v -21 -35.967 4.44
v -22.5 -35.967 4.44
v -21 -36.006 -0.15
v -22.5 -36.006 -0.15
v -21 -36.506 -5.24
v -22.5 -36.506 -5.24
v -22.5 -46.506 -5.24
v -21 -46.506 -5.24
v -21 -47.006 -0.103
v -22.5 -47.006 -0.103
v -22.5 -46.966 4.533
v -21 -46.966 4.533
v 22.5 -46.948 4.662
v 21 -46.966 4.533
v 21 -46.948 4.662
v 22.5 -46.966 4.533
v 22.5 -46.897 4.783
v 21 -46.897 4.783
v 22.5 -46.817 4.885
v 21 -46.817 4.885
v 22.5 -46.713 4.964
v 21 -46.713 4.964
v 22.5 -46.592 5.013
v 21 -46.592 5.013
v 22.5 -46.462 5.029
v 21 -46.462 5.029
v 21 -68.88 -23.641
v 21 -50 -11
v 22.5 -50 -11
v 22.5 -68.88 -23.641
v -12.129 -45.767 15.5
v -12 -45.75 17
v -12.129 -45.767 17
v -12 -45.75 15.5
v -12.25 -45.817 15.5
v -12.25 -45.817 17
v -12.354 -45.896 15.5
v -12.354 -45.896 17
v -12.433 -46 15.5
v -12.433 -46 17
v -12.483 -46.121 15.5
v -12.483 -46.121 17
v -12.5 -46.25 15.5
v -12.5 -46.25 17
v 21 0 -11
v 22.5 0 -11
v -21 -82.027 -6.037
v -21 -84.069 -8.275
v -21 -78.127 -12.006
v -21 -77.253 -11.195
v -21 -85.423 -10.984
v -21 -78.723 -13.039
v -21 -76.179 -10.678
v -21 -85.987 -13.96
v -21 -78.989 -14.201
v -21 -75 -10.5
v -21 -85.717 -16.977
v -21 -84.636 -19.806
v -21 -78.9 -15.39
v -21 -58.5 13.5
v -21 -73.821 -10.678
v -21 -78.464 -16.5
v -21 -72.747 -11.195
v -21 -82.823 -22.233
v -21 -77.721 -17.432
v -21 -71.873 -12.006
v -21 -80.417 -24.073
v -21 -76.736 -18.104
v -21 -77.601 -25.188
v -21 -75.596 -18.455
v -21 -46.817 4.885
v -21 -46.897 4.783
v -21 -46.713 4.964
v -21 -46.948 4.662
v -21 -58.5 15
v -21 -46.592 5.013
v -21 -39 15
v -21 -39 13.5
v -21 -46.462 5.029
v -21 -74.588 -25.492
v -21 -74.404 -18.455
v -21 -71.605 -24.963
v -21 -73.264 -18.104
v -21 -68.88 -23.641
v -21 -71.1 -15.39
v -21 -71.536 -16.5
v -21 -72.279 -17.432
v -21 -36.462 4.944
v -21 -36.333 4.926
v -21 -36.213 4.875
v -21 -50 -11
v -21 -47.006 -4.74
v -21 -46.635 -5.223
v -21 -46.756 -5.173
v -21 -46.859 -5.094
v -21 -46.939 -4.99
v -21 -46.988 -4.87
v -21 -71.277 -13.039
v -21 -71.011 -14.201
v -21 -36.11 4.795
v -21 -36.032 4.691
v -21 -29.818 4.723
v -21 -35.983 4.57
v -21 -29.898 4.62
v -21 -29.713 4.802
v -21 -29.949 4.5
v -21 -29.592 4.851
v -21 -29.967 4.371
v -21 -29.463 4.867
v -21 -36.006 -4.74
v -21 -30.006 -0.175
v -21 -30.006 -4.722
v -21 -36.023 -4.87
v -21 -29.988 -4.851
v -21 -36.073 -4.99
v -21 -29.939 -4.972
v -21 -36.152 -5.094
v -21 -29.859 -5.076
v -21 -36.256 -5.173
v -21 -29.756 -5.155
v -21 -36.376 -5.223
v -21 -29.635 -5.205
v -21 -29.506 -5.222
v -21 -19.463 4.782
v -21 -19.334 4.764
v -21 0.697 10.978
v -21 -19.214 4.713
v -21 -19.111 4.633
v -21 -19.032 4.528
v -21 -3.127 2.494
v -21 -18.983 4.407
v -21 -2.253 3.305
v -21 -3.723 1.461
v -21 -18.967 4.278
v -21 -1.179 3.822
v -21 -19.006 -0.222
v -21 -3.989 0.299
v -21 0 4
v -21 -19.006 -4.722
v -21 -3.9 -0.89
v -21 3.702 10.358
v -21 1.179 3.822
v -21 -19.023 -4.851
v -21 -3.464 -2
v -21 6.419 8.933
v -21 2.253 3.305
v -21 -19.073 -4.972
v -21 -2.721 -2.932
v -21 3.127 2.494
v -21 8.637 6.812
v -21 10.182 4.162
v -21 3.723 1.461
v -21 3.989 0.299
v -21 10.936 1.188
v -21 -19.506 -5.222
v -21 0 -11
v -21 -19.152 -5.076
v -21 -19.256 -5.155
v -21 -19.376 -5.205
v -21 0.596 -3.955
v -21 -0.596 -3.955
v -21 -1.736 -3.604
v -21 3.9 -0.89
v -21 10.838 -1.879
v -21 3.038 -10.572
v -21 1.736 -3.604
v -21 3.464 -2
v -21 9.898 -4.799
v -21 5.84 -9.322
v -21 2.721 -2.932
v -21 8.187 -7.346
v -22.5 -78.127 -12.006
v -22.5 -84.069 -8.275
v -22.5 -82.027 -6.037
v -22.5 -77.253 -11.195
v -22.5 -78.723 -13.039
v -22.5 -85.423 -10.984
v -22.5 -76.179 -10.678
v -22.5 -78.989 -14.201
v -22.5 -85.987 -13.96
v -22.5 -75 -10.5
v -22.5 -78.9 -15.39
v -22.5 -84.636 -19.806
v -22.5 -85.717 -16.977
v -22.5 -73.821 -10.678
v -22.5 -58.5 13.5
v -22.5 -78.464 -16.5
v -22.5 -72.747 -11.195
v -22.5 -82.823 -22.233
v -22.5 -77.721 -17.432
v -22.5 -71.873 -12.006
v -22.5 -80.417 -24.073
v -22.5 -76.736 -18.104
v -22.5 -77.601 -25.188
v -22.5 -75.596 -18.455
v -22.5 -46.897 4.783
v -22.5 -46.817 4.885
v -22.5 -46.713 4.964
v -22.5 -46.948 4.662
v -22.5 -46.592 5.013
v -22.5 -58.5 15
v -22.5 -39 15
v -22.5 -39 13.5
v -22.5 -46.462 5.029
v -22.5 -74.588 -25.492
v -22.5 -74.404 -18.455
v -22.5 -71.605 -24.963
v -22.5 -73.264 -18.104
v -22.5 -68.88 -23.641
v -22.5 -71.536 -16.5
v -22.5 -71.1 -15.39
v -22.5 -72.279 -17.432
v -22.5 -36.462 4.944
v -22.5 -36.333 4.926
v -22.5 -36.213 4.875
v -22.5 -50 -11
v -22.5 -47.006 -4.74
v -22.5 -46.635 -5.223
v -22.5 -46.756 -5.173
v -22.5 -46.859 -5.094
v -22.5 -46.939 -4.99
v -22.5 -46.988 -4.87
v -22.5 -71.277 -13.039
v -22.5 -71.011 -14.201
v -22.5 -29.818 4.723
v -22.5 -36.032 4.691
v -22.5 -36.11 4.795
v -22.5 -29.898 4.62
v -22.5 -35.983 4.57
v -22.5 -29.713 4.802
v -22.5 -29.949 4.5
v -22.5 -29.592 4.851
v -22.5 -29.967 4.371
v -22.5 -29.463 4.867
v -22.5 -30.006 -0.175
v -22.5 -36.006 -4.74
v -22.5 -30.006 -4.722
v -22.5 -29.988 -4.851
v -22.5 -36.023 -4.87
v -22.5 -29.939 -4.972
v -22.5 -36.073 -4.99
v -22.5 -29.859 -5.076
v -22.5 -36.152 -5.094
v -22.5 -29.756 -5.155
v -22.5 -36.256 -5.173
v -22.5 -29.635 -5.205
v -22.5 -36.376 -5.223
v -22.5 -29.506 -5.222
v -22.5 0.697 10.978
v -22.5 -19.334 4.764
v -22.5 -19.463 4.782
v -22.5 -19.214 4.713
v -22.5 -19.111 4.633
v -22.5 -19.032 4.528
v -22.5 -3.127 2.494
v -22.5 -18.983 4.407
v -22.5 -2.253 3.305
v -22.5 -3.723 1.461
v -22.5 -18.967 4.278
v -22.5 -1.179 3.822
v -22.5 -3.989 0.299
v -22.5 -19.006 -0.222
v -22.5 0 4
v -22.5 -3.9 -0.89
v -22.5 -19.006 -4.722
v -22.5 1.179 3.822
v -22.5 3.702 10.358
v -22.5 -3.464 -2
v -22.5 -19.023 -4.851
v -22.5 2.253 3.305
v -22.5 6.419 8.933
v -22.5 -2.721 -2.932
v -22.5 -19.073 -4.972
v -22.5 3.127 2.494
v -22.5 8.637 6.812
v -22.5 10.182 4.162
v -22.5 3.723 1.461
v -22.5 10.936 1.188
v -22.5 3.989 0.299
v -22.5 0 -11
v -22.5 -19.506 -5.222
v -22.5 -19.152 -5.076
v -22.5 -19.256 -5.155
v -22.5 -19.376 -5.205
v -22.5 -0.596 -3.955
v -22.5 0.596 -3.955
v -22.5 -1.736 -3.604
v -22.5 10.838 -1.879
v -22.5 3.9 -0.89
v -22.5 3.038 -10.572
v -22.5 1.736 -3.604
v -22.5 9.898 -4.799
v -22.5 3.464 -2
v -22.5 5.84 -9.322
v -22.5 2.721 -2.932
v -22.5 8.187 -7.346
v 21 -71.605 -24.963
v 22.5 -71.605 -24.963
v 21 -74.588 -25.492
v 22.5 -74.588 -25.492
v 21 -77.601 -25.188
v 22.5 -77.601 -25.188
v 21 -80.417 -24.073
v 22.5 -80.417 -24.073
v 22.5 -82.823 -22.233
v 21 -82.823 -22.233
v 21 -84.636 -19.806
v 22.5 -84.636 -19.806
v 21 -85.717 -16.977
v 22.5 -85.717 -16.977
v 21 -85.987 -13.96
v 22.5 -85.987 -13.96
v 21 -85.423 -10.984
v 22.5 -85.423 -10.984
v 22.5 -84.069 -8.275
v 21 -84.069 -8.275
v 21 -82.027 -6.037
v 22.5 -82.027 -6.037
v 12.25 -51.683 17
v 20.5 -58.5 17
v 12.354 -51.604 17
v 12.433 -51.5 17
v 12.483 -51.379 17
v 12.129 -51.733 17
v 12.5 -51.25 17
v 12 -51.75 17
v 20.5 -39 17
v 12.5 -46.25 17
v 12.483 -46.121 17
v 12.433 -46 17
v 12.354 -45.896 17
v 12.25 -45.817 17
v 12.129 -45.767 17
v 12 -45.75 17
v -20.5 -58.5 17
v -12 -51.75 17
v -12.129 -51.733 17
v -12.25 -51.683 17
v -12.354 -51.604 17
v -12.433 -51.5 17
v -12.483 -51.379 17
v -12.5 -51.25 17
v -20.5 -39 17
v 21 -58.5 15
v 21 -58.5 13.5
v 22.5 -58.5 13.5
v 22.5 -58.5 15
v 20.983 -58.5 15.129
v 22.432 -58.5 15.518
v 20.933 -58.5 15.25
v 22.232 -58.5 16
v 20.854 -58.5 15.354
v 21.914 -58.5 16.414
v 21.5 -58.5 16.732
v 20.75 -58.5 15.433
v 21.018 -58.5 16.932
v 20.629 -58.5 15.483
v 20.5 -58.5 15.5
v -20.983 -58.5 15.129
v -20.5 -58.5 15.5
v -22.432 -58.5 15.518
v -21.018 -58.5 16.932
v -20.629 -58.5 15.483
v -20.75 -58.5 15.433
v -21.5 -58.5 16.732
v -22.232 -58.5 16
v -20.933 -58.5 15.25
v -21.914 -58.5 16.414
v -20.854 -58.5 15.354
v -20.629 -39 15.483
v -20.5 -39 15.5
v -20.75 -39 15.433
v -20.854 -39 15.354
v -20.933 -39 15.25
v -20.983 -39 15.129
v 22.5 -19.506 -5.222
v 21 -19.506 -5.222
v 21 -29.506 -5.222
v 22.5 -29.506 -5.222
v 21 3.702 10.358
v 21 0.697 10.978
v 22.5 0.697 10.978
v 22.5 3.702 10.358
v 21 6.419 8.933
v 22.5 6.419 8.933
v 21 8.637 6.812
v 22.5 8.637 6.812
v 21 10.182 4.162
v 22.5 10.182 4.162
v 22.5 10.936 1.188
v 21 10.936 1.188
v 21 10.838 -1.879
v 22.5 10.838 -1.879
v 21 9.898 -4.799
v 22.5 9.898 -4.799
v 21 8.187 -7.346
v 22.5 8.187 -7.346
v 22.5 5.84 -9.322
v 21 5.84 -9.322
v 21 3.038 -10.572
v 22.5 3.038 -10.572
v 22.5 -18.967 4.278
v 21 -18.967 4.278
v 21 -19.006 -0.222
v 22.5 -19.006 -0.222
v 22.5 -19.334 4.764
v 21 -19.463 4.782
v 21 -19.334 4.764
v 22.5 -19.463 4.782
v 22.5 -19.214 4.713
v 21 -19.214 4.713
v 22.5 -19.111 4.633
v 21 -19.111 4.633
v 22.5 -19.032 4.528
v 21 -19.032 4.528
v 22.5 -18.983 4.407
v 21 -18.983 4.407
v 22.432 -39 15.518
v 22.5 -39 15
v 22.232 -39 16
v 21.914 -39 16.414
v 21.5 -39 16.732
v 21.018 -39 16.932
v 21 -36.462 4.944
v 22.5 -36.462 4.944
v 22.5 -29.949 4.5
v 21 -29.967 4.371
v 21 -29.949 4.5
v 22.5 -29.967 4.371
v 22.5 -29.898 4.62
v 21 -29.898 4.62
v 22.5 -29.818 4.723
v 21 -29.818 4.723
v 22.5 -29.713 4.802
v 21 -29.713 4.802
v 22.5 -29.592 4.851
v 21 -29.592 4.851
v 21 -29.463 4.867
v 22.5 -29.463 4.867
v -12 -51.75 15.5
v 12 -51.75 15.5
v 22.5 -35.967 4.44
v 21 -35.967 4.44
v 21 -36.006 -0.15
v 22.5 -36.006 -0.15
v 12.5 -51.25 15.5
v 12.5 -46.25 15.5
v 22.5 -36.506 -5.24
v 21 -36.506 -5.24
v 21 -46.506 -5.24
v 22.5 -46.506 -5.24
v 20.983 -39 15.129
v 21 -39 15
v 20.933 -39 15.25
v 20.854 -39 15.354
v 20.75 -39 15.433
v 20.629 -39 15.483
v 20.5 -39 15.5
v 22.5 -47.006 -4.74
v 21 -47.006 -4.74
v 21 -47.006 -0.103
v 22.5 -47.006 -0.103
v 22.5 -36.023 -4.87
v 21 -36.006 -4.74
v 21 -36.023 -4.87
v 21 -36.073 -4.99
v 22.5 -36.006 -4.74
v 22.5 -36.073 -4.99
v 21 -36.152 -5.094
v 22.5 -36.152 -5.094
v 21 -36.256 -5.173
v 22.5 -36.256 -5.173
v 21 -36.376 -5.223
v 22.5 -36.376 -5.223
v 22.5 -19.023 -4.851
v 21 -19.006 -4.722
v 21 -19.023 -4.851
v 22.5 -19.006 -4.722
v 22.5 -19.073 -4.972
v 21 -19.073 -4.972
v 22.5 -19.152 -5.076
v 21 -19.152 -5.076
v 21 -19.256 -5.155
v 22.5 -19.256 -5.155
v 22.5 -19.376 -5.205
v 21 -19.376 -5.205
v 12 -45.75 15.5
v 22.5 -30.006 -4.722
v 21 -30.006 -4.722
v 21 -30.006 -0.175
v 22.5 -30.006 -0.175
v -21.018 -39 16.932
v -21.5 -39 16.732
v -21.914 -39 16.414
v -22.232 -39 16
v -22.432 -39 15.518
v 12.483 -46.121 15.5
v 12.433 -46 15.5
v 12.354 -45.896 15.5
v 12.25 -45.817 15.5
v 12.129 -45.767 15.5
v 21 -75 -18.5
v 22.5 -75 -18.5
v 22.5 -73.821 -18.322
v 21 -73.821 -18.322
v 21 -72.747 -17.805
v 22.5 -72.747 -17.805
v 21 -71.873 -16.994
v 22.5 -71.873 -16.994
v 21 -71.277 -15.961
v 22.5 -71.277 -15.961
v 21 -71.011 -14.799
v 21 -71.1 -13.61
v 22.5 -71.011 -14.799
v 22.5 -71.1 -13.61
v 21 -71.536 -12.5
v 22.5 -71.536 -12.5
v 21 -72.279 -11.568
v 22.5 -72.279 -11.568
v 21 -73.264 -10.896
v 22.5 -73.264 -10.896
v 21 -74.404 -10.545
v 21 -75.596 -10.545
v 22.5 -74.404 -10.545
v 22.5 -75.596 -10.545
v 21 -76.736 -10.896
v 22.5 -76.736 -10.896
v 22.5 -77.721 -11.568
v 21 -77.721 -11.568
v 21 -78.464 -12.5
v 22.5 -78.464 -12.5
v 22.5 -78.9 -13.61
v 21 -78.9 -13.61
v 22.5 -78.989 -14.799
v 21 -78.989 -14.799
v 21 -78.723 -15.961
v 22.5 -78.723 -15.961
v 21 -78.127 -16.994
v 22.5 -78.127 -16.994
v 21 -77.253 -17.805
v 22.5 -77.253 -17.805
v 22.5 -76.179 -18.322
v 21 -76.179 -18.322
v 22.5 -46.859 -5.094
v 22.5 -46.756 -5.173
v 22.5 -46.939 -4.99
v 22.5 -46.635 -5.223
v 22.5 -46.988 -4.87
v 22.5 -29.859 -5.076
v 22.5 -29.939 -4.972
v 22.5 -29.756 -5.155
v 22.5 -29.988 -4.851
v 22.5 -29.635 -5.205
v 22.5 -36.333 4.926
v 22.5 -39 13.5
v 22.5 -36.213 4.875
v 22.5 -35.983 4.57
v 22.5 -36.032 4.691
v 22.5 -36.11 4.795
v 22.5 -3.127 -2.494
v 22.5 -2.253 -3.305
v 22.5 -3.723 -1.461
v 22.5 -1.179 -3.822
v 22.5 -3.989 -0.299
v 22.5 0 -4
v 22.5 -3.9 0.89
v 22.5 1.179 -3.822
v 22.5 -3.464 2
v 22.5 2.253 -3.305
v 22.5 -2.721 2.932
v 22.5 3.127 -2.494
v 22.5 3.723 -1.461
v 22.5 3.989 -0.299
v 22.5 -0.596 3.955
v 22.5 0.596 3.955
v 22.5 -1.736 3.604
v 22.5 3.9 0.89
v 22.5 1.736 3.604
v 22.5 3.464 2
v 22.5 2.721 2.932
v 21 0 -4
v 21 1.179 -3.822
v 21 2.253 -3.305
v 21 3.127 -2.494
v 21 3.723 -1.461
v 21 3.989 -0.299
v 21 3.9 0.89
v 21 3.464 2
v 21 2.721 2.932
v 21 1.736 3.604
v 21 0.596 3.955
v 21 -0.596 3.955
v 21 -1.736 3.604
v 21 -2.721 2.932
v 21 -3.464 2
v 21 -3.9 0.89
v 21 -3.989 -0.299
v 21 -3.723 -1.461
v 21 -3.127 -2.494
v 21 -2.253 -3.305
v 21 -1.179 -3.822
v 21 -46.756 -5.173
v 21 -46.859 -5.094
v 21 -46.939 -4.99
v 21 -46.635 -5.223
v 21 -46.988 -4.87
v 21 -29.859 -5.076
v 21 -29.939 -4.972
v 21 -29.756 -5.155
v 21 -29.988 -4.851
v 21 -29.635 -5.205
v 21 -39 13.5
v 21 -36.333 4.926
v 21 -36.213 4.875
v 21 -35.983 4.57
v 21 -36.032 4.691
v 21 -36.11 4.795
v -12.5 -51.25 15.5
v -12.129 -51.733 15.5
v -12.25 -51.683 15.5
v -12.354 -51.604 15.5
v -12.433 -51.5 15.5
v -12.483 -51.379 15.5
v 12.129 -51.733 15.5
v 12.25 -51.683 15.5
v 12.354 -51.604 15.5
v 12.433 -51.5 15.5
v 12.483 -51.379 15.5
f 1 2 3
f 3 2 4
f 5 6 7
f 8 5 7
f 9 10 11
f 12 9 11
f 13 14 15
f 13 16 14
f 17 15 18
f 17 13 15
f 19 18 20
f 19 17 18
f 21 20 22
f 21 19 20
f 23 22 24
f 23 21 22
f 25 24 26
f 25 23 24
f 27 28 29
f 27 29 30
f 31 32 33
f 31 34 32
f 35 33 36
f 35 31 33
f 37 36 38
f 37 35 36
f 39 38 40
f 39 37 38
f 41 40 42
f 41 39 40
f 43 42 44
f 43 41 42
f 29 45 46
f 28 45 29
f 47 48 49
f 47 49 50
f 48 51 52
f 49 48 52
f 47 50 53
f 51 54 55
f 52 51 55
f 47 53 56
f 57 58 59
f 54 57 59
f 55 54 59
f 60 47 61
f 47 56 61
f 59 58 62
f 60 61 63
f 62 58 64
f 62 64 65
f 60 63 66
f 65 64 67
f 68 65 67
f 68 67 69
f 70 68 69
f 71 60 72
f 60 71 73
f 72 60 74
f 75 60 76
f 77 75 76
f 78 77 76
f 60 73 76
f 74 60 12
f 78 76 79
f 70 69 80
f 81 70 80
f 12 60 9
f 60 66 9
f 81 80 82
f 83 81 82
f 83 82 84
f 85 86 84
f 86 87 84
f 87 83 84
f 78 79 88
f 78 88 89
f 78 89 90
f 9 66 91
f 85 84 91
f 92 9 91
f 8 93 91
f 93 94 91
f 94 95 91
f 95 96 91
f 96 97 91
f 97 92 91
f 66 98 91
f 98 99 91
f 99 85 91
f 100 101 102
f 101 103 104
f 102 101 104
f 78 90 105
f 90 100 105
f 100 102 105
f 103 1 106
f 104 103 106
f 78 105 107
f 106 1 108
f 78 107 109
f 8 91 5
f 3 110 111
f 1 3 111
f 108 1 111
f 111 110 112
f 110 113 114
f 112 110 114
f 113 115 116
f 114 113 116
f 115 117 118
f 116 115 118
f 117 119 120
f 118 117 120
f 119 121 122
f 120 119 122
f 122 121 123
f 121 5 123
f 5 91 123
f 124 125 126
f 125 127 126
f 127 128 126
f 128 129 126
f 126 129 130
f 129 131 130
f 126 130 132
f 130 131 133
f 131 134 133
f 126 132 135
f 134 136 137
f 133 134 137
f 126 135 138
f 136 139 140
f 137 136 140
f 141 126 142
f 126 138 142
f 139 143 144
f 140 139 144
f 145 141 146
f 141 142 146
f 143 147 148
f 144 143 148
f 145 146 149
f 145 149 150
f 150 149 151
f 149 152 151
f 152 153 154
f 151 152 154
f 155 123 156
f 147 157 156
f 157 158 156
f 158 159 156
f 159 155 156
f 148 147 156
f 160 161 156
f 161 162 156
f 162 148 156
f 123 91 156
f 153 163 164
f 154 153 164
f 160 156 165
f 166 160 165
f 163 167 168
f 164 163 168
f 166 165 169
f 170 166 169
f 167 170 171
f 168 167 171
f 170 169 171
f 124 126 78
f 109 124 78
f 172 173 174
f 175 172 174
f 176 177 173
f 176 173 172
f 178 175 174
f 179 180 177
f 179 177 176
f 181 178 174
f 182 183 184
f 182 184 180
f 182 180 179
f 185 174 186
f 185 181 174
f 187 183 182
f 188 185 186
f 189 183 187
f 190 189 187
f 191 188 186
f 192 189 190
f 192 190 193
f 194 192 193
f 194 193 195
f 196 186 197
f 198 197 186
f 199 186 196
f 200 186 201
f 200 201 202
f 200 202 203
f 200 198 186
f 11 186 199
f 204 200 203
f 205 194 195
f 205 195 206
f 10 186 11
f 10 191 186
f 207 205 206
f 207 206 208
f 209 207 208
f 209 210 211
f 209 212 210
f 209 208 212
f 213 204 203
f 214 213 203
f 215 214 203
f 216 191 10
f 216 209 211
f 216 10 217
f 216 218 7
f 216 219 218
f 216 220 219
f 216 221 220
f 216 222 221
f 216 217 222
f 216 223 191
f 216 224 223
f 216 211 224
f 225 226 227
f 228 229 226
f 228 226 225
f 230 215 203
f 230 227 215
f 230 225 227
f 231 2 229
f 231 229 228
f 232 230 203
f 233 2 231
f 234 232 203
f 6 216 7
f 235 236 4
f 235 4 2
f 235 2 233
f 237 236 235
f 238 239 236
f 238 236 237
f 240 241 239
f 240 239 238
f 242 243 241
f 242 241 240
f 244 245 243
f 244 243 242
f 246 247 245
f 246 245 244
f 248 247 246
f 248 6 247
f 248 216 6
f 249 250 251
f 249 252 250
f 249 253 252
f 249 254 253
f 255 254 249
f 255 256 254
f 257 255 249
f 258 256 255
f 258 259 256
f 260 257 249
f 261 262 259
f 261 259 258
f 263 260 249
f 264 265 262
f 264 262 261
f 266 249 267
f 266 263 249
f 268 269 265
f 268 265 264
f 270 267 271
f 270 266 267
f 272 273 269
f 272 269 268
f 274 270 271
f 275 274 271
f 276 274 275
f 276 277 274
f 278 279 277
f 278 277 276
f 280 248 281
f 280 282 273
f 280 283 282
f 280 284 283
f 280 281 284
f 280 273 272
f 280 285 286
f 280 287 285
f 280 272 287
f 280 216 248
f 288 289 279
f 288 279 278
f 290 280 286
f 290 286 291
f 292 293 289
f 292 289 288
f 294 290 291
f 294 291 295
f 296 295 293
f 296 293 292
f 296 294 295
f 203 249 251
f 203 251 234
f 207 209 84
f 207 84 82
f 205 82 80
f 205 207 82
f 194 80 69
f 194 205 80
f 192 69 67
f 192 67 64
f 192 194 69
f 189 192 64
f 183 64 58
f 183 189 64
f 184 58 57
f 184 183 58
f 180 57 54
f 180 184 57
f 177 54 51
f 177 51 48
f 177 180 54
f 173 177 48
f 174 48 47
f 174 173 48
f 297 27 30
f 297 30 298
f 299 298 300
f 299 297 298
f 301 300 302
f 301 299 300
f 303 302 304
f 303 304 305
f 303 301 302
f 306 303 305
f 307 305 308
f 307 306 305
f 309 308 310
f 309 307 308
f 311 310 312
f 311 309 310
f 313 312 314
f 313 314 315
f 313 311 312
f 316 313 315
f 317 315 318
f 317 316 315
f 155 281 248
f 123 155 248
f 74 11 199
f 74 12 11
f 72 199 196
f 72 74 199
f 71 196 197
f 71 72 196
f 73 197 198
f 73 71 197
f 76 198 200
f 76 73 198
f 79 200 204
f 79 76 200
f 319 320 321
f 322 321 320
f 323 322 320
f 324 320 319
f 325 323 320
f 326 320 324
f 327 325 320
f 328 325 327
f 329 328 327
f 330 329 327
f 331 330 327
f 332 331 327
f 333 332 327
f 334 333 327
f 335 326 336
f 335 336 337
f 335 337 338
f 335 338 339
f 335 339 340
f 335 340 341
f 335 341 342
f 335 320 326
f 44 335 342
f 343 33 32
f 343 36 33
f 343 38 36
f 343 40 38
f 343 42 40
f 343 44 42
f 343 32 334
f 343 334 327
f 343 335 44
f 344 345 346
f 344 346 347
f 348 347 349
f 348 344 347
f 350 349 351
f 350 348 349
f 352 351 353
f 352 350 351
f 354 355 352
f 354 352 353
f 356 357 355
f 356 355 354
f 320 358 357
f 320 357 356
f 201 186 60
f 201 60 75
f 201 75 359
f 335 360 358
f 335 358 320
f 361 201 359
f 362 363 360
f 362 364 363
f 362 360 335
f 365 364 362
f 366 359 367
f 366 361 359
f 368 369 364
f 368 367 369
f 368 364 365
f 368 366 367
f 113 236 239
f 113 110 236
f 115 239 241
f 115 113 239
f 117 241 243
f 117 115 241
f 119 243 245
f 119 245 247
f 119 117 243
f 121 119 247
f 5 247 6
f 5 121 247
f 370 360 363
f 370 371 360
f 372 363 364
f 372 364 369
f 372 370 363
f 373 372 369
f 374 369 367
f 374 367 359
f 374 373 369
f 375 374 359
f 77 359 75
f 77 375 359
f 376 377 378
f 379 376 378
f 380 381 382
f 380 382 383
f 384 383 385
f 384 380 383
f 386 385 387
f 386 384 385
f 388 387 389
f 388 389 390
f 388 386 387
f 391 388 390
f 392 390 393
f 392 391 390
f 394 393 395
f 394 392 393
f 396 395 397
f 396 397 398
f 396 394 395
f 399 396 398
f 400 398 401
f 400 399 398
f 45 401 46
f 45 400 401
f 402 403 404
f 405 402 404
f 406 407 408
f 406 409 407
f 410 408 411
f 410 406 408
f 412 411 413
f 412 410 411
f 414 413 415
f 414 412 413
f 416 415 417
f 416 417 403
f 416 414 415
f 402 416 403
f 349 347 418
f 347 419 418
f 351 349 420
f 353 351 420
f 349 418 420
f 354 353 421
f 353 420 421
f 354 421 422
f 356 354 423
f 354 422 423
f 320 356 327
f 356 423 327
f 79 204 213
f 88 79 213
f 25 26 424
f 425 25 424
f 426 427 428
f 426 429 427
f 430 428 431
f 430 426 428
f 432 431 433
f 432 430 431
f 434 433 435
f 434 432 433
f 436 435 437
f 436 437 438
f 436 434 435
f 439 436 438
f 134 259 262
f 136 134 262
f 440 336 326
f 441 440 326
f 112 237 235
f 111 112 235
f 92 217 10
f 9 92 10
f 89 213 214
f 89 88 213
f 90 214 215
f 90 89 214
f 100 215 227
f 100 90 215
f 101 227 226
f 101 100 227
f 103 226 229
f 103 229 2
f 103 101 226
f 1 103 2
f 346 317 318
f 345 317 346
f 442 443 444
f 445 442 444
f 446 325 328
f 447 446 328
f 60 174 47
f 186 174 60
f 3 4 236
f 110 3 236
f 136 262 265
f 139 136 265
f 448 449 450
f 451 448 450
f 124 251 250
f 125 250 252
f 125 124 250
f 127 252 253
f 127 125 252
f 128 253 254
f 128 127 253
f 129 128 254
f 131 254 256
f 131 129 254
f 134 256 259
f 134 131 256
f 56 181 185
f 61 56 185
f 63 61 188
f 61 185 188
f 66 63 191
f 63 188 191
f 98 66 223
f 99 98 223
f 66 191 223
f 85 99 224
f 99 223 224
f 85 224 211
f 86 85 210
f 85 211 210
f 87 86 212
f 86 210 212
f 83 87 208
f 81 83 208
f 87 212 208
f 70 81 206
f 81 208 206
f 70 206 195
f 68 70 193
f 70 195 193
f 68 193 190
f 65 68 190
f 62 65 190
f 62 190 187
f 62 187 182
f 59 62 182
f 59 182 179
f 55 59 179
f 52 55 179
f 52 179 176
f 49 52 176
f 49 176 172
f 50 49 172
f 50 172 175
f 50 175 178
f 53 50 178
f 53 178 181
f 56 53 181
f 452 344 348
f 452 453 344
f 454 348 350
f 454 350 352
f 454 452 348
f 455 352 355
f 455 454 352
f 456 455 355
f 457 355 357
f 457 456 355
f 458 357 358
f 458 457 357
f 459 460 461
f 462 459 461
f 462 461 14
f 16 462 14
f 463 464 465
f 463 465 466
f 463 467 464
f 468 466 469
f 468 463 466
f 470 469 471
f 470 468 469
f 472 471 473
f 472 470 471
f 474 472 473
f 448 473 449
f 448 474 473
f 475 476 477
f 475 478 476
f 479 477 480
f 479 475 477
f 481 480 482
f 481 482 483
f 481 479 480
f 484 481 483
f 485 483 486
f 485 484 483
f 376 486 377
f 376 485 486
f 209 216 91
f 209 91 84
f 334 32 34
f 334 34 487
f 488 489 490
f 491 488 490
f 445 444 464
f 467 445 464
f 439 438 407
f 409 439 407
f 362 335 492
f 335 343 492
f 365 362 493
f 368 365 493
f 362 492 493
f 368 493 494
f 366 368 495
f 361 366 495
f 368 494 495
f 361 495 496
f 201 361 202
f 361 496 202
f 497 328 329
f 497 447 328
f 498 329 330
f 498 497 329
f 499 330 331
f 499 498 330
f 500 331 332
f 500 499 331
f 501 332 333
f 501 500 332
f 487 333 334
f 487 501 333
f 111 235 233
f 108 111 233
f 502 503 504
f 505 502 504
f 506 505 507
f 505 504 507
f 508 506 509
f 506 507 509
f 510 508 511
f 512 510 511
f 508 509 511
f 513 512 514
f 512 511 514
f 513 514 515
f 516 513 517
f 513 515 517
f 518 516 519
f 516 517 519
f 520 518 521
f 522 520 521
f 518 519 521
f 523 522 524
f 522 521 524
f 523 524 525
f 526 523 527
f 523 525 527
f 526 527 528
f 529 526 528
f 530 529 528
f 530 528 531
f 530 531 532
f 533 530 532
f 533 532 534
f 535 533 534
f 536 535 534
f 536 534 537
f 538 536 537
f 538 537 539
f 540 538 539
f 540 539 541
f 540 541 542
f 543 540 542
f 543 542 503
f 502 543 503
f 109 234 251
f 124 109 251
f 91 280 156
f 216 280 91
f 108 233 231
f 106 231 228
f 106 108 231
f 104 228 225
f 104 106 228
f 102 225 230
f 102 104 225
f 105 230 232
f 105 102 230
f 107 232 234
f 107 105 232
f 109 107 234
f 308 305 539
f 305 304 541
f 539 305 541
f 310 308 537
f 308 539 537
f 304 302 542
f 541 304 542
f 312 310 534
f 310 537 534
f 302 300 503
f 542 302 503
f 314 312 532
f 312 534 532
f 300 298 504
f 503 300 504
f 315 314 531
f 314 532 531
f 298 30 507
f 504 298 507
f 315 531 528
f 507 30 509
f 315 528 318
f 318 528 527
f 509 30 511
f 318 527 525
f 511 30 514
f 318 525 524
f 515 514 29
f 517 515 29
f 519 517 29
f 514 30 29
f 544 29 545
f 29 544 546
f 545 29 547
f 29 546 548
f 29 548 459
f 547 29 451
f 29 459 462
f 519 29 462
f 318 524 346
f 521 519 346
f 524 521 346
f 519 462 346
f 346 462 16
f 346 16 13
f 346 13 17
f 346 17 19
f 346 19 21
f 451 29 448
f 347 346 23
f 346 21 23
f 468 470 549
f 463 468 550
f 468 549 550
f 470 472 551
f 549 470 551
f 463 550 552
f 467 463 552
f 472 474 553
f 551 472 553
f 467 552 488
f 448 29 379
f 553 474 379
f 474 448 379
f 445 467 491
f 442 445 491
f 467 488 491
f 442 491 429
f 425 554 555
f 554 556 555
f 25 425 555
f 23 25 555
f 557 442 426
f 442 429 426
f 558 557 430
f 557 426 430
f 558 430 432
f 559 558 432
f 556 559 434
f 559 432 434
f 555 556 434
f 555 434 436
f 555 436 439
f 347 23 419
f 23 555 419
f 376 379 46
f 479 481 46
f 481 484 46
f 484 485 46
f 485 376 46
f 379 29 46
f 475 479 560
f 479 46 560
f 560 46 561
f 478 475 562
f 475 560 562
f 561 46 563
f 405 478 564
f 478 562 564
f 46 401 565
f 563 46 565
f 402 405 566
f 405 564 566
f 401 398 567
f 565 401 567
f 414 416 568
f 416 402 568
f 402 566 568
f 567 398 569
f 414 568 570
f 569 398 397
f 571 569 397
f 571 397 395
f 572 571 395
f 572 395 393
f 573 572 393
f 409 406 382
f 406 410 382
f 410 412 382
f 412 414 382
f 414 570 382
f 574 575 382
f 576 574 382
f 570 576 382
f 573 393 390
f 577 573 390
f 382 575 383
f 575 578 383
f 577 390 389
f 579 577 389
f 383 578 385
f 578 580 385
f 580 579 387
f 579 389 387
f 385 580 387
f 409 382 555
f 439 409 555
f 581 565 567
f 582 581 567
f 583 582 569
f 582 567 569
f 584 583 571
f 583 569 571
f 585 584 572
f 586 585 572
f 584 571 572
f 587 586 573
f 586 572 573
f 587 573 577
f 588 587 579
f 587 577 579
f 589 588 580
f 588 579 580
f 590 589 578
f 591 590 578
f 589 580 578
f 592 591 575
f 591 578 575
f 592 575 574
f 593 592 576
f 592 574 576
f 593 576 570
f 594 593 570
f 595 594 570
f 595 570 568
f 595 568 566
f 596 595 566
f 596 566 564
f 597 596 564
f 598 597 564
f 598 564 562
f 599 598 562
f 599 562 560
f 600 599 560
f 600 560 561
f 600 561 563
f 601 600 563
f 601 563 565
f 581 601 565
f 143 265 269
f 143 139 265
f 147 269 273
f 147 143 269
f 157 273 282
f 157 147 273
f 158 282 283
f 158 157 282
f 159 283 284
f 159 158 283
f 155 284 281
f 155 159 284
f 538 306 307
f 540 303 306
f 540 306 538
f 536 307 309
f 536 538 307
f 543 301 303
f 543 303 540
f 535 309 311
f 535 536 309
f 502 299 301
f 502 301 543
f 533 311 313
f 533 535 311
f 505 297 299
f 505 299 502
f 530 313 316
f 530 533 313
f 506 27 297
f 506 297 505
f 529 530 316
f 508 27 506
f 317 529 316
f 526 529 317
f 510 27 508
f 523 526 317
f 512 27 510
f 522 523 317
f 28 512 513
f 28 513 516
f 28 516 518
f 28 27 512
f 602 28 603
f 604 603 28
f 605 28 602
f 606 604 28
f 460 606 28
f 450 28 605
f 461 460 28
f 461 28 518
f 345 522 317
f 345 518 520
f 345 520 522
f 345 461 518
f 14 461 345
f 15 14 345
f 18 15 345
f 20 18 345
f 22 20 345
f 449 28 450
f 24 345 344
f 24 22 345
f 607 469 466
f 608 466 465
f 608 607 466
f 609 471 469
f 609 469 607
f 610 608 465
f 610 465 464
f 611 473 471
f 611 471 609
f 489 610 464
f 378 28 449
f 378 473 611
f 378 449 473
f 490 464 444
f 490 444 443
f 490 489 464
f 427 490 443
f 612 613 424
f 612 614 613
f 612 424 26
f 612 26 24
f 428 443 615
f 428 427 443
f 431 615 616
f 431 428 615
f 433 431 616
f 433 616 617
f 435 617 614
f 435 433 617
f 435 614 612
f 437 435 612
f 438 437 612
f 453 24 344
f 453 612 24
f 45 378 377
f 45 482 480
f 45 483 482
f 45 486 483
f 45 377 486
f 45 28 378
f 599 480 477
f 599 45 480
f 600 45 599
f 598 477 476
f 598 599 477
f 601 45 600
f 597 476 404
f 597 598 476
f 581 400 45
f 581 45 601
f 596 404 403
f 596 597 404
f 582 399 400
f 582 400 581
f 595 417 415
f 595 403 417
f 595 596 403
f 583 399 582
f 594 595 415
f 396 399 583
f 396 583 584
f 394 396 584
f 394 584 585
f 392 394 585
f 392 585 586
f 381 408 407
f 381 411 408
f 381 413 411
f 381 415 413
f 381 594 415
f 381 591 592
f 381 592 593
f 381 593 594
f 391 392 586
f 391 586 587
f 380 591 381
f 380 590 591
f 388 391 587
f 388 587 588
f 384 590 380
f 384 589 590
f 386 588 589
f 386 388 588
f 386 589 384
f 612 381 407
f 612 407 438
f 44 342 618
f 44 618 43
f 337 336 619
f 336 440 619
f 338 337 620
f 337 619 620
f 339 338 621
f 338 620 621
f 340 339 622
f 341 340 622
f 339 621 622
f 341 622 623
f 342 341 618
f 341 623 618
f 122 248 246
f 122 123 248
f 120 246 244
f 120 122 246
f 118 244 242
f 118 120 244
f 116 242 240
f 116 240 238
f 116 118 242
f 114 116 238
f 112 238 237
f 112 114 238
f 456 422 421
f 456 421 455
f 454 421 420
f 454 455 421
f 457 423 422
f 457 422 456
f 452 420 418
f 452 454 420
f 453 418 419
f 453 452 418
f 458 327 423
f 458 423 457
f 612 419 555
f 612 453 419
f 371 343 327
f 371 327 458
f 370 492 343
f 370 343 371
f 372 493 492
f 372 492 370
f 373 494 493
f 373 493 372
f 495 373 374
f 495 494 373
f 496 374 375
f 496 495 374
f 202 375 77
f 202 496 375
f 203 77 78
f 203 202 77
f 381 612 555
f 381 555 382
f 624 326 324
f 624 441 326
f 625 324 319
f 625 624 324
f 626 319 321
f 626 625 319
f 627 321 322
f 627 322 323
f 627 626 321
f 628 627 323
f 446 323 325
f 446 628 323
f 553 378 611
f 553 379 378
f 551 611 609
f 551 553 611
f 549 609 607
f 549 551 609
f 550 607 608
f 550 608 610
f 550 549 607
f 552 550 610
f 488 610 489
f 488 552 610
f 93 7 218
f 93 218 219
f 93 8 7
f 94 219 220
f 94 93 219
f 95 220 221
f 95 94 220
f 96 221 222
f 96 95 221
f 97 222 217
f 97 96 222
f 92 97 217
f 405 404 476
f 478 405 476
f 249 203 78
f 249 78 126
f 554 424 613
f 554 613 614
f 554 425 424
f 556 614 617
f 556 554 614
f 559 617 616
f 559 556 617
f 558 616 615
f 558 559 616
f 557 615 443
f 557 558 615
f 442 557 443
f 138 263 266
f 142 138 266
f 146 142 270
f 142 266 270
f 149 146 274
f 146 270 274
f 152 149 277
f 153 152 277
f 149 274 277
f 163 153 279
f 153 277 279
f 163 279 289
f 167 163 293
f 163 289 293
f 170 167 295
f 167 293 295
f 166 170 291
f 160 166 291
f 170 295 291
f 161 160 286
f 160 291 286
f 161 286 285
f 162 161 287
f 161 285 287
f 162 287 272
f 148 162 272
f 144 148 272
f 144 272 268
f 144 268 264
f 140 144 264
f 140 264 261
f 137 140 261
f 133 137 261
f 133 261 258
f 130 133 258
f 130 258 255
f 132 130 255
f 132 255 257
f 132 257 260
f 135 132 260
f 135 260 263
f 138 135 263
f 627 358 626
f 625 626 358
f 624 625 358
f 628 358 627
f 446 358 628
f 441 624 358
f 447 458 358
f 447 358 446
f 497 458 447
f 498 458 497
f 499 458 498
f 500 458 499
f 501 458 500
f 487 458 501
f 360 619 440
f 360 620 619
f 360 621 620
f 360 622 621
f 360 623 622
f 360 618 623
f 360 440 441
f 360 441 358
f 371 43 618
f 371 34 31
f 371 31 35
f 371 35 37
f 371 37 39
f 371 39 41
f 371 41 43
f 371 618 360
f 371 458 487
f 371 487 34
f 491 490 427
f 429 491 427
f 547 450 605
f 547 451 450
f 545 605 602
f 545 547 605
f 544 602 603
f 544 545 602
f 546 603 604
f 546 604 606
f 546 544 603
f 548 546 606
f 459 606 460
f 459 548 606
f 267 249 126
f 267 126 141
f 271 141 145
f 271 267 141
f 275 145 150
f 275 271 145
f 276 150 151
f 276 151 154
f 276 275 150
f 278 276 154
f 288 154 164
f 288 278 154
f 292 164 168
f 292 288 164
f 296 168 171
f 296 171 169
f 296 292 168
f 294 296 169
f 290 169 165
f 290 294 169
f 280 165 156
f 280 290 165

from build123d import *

# Parameters (mm, degrees)
BOSS_EXTRUDE1_DEPTH          = 1.5
SKETCH2_W                    = 43.5
SKETCH2_H                    = 19.5
BOSS_EXTRUDE2_DEPTH          = 3.5
SKETCH3_W                    = 42
SKETCH3_H                    = 19.5
CUT_EXTRUDE1_DEPTH           = 2
BOSS_EXTRUDE3_DEPTH          = 1.5
F_8_0_8_DIAMETER_HOLE1_D     = 8
F_8_0_8_DIAMETER_HOLE1_DEPTH = 1.5
F_8_0_8_DIAMETER_HOLE2_D     = 8
F_8_0_8_DIAMETER_HOLE2_DEPTH = 1.5
FILLET1_R                    = 0.5
FILLET2_R                    = 2
SKETCH9_W                    = 25
SKETCH9_H                    = 6
CUT_EXTRUDE2_DEPTH           = 1.5
FILLET3_R                    = 0.5
CUT_EXTRUDE3_DEPTH           = 45
FILLET4_R                    = 0.5


with BuildPart() as part:
    # Sketch1 → Boss-Extrude1 (new body)
    with BuildSketch(Plane(origin=(-22.5, 0, 0), x_dir=(0, -1, 0), z_dir=(-1, 0, 0))):
        with BuildLine():
            Line((82.02741971, -6.037413385), (58.5, 13.5))
            Line((58.5, 13.5), (39, 13.5))
            Line((39, 13.5), (-0.697466415, 10.97786594))
            ThreePointArc((-0.697466415, 10.97786594), (-10.994465093, -0.348908769), (0, -11))
            Line((0, -11), (50, -11))
            Line((50, -11), (68.880323706, -23.640544954))
            ThreePointArc((68.880323706, -23.640544954), (83.813260452, -21.082282295), (82.02741971, -6.037413385))
        make_face()
    extrude(amount=-BOSS_EXTRUDE1_DEPTH)

    # Sketch2 → Boss-Extrude2 (add)
    with BuildSketch(Plane.XY.offset(13.5)):
        with Locations((-0.75, -48.75)):
            Rectangle(SKETCH2_W, SKETCH2_H)
    extrude(amount=BOSS_EXTRUDE2_DEPTH)

    # Sketch3 → Cut-Extrude1 (cut)
    with BuildSketch(Plane(origin=(0, 0, 13.5), x_dir=(-1, 0, 0), z_dir=(0, 0, -1))):
        with Locations((0, -48.75)):
            Rectangle(SKETCH3_W, SKETCH3_H)
    extrude(amount=-CUT_EXTRUDE1_DEPTH, mode=Mode.SUBTRACT)

    # Sketch4 → Boss-Extrude3 (add)
    with BuildSketch(Plane(origin=(21, 0, 0), x_dir=(0, 0, -1), z_dir=(1, 0, 0))):
        with BuildLine():
            Line((11, 0), (11, -50))
            Line((11, -50), (23.640544954, -68.880323706))
            ThreePointArc((23.640544954, -68.880323706), (21.082282295, -83.813260452), (6.037413385, -82.02741971))
            Line((6.037413385, -82.02741971), (-13.5, -58.5))
            Line((-13.5, -58.5), (-17, -58.5))
            Line((-17, -58.5), (-17, -39))
            Line((-17, -39), (-13.5, -39))
            Line((-13.5, -39), (-10.97786594, 0.697466415))
            ThreePointArc((-10.97786594, 0.697466415), (0.348908769, 10.994465093), (11, 0))
        make_face()
    extrude(amount=BOSS_EXTRUDE3_DEPTH)

    # Ø8.0 (8) Diameter Hole1
    with Locations(Plane.ZY.offset(-21)):
        with Locations((-14.5, -75), (0, 0)):
            Hole(F_8_0_8_DIAMETER_HOLE1_D / 2, depth=F_8_0_8_DIAMETER_HOLE1_DEPTH)

    # Ø8.0 (8) Diameter Hole2
    with Locations(Plane(origin=(-21, 0, 0), x_dir=(0, 0, -1), z_dir=(1, 0, 0))):
        with Locations((14.5, -75), (0, 0)):
            Hole(F_8_0_8_DIAMETER_HOLE2_D / 2, depth=F_8_0_8_DIAMETER_HOLE2_DEPTH)

    # Fillet1
    fillet1_edges = [part.edges().sort_by_distance(p)[0] for p in [
        (21, -48.75, 15.5),
        (-21, -48.75, 15.5),
    ]]
    fillet(fillet1_edges, radius=FILLET1_R)

    # Fillet2
    fillet2_edges = [part.edges().sort_by_distance(p)[0] for p in [
        (-22.5, -48.75, 17),
        (22.5, -48.75, 17),
    ]]
    fillet(fillet2_edges, radius=FILLET2_R)

    # Sketch9 → Cut-Extrude2 (cut)
    with BuildSketch(Plane.XY.offset(17)):
        with Locations((0, -48.75)):
            Rectangle(SKETCH9_W, SKETCH9_H)
    extrude(amount=-CUT_EXTRUDE2_DEPTH, mode=Mode.SUBTRACT)

    # Fillet3
    fillet3_edges = [part.edges().sort_by_distance(p)[0] for p in [
        (12.5, -51.75, 16.25),
        (-12.5, -51.75, 16.25),
        (-12.5, -45.75, 16.25),
        (12.5, -45.75, 16.25),
    ]]
    fillet(fillet3_edges, radius=FILLET3_R)

    # Sketch11 → Cut-Extrude3 (cut)
    with BuildSketch(Plane.ZY.offset(22.5)):
        Polygon((-0.103461549, -47.005534907), (5.033080081, -46.962059996), (4.939981079, -35.962453976), (-0.150011884, -36.005534907), (-5.240187158, -36.005534907), (-5.240187158, -47.005534907), align=None)
        Polygon((-0.22195331, -19.005534907), (-5.22195331, -19.005534907), (-5.22195331, -30.005534907), (-0.175402975, -30.005534907), (4.87096661, -29.962823198), (4.777867607, -18.963217179), align=None)
    extrude(amount=-CUT_EXTRUDE3_DEPTH, mode=Mode.SUBTRACT)

    # Fillet4
    fillet4_edges = [part.edges().sort_by_distance(p)[0] for p in [
        (-21.75, -36.005534907, -0.150011884),
        (-21.75, -35.962453976, 4.939981079),
        (-21.75, -46.962059996, 5.033080081),
        (-21.75, -47.005534907, -0.103461549),
        (-21.75, -47.005534907, -5.240187158),
        (-21.75, -36.005534907, -5.240187158),
        (21.75, -36.005534907, -0.150011884),
        (21.75, -35.962453976, 4.939981079),
        (21.75, -46.962059996, 5.033080081),
        (21.75, -47.005534907, -0.103461549),
        (21.75, -47.005534907, -5.240187158),
        (21.75, -36.005534907, -5.240187158),
        (-21.75, -19.005534907, -0.22195331),
        (-21.75, -18.963217179, 4.777867607),
        (-21.75, -29.962823198, 4.87096661),
        (-21.75, -30.005534907, -0.175402975),
        (-21.75, -30.005534907, -5.22195331),
        (-21.75, -19.005534907, -5.22195331),
        (21.75, -19.005534907, -0.22195331),
        (21.75, -18.963217179, 4.777867607),
        (21.75, -29.962823198, 4.87096661),
        (21.75, -30.005534907, -0.175402975),
        (21.75, -30.005534907, -5.22195331),
        (21.75, -19.005534907, -5.22195331),
    ]]
    fillet(fillet4_edges, radius=FILLET4_R)


solid = part.part
